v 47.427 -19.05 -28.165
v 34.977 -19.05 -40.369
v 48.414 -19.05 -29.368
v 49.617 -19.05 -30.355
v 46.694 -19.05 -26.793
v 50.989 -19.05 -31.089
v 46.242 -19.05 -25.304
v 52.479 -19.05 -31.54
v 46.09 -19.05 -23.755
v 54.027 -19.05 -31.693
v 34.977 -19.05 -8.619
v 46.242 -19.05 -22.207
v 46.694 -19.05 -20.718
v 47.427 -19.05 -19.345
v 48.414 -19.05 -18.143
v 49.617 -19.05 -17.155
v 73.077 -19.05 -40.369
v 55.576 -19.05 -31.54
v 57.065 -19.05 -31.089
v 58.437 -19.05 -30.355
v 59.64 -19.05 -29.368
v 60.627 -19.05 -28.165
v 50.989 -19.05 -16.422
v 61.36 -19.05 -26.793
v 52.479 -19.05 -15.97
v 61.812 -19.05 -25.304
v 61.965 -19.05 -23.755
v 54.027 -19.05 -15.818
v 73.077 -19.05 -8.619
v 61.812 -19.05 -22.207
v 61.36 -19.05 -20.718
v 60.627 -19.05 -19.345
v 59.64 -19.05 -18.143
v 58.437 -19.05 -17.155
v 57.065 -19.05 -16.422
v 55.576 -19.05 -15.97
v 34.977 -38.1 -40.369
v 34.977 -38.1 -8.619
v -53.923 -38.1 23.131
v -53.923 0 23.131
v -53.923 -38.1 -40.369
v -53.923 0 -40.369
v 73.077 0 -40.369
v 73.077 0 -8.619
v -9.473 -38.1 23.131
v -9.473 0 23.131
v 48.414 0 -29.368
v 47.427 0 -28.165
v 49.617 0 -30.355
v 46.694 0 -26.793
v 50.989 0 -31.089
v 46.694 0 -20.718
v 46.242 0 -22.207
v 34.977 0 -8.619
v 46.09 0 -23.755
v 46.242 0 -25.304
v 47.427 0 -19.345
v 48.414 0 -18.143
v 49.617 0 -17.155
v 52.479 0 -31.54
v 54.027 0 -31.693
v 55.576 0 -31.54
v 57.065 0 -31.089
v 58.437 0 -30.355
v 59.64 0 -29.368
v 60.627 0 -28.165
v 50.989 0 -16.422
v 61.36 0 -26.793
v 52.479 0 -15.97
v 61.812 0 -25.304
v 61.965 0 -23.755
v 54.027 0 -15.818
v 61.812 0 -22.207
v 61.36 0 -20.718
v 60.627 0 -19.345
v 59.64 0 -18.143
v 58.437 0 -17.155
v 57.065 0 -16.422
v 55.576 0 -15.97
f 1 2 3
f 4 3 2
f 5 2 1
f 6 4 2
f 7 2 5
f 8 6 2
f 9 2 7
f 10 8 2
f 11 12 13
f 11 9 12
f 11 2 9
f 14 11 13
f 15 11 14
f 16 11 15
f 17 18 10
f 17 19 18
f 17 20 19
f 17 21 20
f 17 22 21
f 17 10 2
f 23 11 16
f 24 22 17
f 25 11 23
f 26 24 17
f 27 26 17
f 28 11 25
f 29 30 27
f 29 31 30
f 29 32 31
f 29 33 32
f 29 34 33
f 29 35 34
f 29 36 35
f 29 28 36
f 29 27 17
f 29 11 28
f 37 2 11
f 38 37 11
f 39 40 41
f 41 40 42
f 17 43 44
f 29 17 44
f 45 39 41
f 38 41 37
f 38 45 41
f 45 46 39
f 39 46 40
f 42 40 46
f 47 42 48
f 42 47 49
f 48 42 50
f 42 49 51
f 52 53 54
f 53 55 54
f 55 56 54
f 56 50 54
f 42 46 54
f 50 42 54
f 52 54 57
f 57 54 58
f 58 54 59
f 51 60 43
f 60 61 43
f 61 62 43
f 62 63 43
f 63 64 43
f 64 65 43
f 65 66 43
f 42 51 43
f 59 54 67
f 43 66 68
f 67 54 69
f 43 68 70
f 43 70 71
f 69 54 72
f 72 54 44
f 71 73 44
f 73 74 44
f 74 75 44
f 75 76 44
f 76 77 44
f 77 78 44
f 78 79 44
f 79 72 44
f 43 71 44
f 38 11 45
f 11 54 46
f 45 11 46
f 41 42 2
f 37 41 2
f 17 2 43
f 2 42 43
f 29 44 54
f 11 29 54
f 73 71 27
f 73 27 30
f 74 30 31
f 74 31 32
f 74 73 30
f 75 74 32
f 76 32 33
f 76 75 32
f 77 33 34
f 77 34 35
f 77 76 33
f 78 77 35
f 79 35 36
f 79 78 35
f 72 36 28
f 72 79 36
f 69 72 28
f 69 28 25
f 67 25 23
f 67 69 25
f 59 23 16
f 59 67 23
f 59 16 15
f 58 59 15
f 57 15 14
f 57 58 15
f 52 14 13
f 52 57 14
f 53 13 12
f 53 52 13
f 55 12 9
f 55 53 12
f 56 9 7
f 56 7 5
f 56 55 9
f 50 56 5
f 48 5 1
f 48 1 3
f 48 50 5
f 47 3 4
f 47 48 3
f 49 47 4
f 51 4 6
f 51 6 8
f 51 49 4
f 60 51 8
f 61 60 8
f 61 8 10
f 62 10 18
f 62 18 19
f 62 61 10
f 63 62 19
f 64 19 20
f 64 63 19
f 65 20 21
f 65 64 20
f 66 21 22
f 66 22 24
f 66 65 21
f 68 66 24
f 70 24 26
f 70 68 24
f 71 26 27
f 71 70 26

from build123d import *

# Parameters (mm, degrees)
F1_DEPTH = 38.1
F0_R     = 7.9375
F2_DEPTH = 19.05


with BuildPart() as f1:
    # F0 (on Front) → F1 (new body)
    with BuildSketch(Plane.XZ):
        Polygon((-53.922951, 23.130657), (-53.922951, -40.369343), (34.977049, -40.369343), (34.977049, -8.619343), (-9.472951, 23.130657), align=None)
    extrude(amount=F1_DEPTH)

    # F0 (on Front) → F2 (join)
    with BuildSketch(Plane.XZ):
        Polygon((34.977049, -8.619343), (34.977049, -40.369343), (73.077049, -40.369343), (73.077049, -8.619343), (54.027049, -8.619343), align=None)
        with Locations((54.027049, -23.755247)):
            Circle(F0_R, mode=Mode.SUBTRACT)
    extrude(amount=F2_DEPTH)


solid = f1.part
